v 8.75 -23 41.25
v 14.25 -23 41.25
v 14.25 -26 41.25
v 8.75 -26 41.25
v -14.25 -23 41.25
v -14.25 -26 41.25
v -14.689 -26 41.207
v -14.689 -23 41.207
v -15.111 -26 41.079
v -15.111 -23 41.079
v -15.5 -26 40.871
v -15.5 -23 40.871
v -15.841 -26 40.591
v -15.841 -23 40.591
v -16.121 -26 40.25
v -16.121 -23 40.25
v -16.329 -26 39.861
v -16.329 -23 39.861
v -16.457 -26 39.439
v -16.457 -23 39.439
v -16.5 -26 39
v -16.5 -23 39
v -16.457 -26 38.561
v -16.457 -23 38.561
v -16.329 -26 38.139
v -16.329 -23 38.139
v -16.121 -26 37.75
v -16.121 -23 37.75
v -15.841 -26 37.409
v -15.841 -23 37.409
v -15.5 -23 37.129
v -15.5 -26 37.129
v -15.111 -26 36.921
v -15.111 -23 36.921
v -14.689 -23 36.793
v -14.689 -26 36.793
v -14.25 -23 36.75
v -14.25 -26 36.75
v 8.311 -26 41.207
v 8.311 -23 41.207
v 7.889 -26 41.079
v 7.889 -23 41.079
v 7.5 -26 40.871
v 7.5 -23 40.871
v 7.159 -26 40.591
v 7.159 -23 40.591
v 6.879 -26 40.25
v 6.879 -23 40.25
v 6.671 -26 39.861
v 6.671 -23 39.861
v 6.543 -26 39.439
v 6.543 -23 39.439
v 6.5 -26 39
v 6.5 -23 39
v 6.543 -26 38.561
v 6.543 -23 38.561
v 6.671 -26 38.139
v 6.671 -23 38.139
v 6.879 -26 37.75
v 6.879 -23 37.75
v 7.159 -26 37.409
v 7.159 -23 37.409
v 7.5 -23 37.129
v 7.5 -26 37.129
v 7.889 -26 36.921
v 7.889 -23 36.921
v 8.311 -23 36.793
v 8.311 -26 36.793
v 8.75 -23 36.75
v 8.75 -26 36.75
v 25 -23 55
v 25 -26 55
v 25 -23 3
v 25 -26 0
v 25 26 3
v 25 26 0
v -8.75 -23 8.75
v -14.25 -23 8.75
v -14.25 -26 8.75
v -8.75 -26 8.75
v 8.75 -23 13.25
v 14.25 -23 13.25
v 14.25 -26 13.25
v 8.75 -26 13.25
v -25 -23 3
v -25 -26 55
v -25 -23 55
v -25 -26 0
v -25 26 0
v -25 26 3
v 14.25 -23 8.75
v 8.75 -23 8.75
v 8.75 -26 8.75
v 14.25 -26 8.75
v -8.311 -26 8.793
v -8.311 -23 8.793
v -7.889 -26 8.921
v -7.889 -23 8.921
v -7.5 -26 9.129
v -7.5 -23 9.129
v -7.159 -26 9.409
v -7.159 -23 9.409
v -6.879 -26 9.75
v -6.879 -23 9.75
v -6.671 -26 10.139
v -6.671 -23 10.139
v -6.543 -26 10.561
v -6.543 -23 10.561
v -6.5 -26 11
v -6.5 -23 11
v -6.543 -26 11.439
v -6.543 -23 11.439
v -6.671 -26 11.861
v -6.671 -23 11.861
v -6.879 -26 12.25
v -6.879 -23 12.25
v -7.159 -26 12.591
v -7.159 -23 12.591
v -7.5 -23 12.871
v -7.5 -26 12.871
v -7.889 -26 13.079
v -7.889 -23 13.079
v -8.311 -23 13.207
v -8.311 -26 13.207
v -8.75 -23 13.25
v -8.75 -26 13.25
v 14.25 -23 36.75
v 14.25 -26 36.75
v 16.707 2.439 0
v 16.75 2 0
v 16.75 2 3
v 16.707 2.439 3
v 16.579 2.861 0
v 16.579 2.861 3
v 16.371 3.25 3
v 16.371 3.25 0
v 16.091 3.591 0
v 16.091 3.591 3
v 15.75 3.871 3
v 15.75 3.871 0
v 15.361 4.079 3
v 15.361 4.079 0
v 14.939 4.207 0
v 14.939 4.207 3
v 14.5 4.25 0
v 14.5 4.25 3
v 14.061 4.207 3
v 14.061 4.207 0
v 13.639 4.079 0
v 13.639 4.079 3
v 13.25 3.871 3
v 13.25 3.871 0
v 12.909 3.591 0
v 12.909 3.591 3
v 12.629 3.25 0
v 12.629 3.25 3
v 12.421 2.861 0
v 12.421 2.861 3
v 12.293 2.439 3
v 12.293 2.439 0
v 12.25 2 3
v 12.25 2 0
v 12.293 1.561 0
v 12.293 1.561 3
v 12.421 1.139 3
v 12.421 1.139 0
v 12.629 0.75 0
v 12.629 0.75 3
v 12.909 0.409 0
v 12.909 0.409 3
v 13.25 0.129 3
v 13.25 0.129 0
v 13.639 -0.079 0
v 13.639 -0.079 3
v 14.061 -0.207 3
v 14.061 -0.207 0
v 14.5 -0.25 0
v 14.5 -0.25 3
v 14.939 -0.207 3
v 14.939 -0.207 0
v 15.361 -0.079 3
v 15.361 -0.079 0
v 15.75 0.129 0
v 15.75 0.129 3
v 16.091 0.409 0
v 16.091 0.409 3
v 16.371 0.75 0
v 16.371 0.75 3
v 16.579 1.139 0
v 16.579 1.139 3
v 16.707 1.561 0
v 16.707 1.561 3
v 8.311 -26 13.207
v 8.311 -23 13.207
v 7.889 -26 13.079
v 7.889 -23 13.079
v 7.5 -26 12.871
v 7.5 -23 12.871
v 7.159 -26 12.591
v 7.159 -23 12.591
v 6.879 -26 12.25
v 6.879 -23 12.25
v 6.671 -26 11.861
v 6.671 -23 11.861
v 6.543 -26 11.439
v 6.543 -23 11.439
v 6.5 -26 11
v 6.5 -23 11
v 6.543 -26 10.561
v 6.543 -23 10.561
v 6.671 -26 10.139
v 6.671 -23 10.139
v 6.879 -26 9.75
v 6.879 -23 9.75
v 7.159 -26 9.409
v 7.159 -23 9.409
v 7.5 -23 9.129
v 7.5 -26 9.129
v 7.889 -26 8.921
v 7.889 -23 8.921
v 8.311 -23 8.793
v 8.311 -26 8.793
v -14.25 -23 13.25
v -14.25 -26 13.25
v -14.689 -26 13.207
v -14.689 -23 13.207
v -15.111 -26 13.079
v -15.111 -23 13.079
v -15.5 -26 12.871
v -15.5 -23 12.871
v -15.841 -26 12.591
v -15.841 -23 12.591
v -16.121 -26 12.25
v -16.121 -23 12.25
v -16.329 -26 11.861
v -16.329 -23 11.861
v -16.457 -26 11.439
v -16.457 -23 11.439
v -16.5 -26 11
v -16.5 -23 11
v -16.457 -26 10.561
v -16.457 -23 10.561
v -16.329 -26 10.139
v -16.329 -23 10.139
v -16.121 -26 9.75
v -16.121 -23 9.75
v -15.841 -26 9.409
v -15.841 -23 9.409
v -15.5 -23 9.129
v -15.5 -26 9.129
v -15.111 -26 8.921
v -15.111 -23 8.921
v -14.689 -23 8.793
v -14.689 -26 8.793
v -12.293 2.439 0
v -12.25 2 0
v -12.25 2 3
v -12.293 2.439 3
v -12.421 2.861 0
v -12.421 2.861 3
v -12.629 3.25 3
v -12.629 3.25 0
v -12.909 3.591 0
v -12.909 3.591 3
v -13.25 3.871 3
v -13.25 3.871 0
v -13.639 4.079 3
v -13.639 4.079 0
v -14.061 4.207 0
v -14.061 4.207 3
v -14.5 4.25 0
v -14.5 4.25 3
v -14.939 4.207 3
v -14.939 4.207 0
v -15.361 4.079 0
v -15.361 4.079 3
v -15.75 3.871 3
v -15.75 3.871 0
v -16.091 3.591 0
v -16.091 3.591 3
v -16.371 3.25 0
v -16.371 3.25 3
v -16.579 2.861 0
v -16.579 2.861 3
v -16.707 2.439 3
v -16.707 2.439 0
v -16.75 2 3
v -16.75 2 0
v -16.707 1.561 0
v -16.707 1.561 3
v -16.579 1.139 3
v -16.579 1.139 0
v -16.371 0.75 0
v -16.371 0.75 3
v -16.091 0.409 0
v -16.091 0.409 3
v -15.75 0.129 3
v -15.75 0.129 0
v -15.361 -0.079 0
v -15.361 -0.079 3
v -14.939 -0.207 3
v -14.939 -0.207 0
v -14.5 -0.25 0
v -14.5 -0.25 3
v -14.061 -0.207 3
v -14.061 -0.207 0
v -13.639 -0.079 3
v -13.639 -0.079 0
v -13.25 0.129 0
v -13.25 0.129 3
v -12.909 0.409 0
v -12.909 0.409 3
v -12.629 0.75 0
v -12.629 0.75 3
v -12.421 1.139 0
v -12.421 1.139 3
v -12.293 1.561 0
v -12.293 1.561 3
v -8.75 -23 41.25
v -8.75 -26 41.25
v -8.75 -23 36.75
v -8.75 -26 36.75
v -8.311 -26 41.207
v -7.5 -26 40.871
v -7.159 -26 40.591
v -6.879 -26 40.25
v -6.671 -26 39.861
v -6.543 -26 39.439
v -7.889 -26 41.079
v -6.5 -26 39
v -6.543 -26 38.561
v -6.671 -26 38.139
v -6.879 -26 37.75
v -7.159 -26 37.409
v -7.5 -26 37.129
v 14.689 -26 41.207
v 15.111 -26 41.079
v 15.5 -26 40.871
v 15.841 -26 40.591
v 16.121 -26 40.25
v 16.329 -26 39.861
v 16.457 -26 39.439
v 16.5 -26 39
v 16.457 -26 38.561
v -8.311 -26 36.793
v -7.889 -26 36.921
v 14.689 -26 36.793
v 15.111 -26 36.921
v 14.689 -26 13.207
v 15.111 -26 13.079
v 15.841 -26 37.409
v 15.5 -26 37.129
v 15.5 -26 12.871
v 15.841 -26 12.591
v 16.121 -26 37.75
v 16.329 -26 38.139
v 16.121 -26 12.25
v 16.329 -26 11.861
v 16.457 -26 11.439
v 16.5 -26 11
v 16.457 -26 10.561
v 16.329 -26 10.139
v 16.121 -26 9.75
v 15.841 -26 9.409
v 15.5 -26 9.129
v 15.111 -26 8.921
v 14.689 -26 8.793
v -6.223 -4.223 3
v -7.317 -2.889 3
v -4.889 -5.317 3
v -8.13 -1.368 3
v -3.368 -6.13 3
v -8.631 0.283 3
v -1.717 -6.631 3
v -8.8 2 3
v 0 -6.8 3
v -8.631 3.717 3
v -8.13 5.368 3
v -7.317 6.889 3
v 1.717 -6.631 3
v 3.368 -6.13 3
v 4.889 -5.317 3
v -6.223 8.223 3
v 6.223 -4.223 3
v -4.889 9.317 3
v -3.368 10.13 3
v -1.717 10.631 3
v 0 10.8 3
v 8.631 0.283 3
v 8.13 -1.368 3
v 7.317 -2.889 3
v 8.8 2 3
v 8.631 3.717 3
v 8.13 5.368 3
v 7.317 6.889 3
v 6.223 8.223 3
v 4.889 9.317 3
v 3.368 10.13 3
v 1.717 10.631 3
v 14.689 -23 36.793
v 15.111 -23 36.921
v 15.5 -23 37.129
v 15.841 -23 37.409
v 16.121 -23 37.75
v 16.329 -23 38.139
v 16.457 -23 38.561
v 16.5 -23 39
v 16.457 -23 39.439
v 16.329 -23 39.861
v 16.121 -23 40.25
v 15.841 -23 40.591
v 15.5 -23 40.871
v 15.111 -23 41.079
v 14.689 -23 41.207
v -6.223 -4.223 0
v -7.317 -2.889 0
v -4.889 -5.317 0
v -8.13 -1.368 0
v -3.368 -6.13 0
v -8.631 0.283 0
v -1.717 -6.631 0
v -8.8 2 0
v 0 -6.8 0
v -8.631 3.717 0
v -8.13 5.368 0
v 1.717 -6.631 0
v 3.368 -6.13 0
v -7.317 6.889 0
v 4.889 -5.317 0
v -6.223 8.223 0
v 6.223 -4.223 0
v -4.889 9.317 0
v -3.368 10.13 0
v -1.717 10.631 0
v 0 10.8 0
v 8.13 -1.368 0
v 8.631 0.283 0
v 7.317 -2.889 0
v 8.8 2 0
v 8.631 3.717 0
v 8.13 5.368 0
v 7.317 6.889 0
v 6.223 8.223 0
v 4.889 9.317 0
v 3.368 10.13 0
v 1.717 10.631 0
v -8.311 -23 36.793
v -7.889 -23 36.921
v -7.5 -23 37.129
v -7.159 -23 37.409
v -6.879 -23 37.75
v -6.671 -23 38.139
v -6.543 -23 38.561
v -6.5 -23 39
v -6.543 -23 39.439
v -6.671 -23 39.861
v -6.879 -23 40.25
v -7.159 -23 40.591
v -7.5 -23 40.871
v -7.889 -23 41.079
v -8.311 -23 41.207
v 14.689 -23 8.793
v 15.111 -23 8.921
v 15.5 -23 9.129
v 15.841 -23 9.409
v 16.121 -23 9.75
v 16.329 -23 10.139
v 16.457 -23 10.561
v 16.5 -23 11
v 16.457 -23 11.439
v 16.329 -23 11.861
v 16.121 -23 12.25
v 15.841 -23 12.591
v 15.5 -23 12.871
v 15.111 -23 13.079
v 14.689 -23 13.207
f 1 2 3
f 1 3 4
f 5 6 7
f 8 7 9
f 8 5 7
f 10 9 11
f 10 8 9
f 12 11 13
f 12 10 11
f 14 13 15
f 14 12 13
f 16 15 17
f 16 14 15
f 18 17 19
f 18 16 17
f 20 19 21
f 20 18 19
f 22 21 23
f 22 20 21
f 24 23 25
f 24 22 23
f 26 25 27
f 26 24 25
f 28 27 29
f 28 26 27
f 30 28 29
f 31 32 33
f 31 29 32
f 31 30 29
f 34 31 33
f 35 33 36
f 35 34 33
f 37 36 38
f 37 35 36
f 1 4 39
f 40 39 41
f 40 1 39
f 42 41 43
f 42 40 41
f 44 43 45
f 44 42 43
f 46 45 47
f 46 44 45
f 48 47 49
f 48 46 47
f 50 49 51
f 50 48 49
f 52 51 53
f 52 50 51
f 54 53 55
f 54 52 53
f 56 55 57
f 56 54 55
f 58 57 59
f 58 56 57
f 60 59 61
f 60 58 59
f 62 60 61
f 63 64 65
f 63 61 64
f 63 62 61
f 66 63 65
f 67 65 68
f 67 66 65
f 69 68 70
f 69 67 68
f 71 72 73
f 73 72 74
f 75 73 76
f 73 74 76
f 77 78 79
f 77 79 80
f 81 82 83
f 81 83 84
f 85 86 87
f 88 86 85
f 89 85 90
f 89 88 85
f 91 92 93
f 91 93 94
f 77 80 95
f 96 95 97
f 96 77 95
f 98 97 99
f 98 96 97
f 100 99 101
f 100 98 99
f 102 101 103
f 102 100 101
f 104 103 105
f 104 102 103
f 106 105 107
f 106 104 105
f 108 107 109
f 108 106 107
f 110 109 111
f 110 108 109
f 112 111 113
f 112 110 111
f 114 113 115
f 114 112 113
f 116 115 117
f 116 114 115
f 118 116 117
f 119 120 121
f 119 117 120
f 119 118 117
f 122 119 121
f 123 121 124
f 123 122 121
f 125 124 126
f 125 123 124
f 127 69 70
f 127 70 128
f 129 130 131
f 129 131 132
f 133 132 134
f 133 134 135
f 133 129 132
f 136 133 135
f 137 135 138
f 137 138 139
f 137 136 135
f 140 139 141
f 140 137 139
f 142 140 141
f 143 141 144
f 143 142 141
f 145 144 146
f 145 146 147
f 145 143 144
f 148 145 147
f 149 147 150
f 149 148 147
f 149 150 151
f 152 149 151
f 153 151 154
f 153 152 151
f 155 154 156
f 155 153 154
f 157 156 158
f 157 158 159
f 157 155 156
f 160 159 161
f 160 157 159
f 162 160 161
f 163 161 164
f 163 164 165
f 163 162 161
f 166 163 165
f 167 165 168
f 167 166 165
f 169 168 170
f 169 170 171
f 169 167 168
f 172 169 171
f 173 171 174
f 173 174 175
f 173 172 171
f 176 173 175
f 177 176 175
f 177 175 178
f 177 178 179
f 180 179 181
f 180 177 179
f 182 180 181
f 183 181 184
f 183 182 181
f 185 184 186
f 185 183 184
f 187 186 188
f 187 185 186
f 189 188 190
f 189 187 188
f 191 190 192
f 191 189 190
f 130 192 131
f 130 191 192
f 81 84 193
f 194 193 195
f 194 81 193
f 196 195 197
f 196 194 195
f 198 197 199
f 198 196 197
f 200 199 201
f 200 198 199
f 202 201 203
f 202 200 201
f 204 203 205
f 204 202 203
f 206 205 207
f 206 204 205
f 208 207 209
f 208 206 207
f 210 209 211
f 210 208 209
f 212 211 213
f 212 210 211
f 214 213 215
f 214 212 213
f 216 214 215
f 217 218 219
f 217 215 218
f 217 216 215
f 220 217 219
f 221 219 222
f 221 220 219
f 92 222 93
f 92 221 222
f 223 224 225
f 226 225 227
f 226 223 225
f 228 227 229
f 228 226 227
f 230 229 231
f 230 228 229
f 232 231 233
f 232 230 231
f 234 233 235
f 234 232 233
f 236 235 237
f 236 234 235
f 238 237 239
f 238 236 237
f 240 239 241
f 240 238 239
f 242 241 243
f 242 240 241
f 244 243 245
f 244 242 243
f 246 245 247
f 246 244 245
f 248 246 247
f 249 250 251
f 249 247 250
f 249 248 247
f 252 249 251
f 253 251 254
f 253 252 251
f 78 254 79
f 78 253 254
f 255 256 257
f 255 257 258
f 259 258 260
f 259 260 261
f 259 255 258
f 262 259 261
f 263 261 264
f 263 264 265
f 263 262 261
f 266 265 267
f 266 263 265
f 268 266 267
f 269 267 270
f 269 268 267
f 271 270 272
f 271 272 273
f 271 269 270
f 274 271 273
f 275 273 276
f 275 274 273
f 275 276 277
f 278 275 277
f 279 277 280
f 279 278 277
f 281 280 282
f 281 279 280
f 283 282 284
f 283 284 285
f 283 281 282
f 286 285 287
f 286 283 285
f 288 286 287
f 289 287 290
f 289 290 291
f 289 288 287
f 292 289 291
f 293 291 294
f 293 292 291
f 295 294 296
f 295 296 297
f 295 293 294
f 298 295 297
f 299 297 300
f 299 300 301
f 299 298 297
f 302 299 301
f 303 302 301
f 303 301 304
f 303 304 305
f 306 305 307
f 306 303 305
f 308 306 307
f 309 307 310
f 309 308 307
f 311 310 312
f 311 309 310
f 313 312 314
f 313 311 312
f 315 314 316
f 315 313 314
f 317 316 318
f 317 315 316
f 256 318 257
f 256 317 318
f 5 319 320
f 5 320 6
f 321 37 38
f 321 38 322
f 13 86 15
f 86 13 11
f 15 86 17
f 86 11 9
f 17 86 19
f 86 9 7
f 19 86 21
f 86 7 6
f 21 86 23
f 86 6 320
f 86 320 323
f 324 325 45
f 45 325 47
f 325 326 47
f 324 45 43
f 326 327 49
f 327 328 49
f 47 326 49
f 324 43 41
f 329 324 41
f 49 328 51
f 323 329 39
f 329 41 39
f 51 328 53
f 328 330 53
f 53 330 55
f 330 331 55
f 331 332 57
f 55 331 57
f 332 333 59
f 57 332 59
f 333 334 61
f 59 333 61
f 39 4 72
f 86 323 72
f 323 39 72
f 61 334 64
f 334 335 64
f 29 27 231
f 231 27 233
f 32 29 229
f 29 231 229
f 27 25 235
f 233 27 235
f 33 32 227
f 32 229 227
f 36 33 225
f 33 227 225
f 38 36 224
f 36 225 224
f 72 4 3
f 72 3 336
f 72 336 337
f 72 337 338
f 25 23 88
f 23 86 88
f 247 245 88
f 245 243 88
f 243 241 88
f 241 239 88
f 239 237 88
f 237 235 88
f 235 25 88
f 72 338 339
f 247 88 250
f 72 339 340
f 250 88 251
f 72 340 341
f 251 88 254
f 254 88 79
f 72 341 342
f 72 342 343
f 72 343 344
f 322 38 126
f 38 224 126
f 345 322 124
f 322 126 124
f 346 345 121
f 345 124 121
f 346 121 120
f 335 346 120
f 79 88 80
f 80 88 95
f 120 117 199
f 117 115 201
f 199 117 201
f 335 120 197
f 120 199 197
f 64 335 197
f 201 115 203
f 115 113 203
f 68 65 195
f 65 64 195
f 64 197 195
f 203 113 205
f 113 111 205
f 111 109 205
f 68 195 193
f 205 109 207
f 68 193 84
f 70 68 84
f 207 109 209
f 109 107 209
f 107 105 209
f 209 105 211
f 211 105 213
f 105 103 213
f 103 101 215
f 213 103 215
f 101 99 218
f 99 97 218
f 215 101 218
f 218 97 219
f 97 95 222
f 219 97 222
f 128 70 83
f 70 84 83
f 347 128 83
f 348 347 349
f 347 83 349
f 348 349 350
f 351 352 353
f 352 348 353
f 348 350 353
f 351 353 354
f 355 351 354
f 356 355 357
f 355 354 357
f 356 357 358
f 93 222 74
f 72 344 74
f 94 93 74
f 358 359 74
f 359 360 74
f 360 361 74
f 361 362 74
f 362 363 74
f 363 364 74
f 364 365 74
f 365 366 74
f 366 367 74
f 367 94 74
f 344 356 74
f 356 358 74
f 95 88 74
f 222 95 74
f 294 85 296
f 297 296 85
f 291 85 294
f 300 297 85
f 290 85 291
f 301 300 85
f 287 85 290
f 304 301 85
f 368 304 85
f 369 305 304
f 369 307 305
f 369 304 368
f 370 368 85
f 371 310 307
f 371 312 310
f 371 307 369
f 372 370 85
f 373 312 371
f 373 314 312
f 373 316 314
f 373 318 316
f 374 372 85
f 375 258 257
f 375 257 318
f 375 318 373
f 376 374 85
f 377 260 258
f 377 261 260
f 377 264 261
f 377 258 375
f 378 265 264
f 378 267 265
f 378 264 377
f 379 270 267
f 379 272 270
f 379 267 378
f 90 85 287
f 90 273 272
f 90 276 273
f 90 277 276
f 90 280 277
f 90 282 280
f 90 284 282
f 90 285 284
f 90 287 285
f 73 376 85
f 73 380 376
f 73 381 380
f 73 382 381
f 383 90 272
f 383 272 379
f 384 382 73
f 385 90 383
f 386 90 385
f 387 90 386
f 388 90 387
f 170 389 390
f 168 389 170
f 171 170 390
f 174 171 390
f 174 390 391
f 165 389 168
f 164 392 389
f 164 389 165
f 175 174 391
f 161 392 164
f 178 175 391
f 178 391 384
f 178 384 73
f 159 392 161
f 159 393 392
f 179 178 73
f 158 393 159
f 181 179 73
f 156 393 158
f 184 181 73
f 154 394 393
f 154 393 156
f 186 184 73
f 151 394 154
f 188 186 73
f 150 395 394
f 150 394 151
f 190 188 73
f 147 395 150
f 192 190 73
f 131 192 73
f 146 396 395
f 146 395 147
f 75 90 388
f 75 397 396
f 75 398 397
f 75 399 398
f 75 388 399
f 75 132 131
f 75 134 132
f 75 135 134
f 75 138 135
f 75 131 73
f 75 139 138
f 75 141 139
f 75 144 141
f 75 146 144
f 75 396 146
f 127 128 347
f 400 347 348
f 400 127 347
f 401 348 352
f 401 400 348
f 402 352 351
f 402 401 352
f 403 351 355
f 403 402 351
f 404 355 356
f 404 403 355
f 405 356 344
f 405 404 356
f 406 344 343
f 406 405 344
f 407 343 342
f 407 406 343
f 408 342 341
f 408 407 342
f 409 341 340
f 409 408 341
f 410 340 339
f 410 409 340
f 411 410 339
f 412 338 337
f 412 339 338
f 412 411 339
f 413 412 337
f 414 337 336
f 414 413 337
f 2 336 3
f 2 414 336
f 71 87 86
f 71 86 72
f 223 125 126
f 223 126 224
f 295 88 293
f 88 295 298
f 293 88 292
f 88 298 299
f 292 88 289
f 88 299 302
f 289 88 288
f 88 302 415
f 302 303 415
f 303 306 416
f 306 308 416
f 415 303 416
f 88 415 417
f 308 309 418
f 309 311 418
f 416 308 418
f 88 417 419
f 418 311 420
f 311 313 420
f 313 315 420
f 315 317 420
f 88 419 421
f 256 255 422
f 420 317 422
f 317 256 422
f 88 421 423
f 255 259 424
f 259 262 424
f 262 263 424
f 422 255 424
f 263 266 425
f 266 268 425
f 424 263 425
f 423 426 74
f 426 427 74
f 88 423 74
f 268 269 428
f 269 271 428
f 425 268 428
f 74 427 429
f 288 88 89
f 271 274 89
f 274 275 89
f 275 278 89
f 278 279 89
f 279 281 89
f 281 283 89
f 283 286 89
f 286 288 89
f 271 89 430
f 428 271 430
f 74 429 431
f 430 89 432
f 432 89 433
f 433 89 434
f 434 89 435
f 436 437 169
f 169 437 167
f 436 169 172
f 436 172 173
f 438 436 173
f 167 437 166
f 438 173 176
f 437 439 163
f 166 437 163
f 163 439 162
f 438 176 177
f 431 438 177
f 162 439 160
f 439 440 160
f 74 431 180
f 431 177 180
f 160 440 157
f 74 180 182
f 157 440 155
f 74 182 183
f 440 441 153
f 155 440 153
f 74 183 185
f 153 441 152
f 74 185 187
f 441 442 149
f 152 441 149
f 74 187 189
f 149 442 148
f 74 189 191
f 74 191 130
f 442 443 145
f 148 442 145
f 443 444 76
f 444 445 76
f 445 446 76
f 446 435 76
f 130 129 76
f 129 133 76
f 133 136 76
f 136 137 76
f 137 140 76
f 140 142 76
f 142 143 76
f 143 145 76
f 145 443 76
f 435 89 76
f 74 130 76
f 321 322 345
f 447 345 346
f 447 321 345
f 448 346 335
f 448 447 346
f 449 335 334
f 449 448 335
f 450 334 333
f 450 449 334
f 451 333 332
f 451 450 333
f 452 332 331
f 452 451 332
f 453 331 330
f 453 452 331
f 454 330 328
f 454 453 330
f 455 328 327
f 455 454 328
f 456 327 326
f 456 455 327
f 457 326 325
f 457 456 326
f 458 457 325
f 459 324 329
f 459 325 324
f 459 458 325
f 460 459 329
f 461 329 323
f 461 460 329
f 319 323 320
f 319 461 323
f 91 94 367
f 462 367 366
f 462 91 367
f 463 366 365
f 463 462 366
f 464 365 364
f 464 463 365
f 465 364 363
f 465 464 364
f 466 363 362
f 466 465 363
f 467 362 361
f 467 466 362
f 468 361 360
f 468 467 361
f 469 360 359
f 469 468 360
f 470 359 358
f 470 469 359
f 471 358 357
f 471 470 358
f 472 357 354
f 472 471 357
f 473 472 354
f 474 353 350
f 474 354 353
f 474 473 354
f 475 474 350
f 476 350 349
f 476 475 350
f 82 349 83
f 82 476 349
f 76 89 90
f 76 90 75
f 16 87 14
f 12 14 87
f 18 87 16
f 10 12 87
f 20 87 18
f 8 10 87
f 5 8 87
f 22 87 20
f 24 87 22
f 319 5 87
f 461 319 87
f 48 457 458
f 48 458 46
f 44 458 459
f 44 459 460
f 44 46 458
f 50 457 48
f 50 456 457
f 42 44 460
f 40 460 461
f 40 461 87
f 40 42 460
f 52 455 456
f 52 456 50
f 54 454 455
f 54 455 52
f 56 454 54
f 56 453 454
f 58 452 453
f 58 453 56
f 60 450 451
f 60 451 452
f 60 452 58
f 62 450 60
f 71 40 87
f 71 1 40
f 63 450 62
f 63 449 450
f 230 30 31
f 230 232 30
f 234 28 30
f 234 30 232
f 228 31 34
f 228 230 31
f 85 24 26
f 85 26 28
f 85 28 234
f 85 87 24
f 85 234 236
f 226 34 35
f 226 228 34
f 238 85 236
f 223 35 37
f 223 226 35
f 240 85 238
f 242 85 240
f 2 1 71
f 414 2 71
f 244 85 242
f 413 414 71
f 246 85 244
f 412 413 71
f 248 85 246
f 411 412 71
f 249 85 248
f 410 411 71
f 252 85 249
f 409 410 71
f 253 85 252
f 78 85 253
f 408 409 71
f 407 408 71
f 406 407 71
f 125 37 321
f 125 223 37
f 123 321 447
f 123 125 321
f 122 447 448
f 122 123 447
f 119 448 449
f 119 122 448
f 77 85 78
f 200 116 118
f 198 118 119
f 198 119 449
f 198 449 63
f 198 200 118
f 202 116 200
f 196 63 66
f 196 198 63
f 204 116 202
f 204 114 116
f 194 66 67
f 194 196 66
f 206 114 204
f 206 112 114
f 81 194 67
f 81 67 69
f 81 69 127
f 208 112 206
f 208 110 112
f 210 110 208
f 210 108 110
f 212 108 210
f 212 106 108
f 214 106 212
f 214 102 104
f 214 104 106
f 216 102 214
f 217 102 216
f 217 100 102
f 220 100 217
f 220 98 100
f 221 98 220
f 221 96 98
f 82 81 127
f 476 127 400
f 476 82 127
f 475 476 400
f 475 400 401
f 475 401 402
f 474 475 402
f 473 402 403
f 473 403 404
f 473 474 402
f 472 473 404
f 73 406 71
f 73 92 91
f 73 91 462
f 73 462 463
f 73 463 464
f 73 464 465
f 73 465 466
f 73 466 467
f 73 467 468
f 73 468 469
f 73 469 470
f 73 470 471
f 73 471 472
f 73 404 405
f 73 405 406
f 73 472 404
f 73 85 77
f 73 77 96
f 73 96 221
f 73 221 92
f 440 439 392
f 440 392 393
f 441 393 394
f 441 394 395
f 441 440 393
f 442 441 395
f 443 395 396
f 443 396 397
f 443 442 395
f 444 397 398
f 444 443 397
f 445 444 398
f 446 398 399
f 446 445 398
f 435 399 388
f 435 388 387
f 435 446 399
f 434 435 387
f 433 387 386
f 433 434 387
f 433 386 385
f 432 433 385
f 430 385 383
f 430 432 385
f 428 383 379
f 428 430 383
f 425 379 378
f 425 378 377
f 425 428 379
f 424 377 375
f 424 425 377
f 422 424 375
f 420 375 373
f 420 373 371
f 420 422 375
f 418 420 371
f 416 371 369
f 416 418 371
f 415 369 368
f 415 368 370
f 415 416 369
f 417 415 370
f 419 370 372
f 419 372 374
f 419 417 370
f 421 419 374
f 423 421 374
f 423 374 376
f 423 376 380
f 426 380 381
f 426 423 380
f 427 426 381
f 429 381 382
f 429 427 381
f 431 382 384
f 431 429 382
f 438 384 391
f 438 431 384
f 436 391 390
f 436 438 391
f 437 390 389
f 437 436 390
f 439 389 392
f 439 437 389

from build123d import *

# Parameters (mm, degrees)
SKIZZE1_W                       = 50
SKIZZE1_H                       = 52
SKIZZE1_R                       = 8.8
SKIZZE1_R_2                     = 2.25
AUFSATZ_LINEAR_AUSTRAGEN1_DEPTH = 3
SKIZZE2_W                       = 50
SKIZZE2_H                       = 2.999801306
AUFSATZ_LINEAR_AUSTRAGEN2_DEPTH = 52
SCHNITT_LINEAR_AUSTRAGEN1_DEPTH = 78.788299069


with BuildPart() as part:
    # Skizze1 → Aufsatz-Linear austragen1 (new body)
    with BuildSketch(Plane.XY):
        Rectangle(SKIZZE1_W, SKIZZE1_H)
        with Locations((0, 2)):
            Circle(SKIZZE1_R, mode=Mode.SUBTRACT)
        with Locations((-14.5, 2)):
            Circle(SKIZZE1_R_2, mode=Mode.SUBTRACT)
        with Locations((14.5, 2)):
            Circle(SKIZZE1_R_2, mode=Mode.SUBTRACT)
    extrude(amount=AUFSATZ_LINEAR_AUSTRAGEN1_DEPTH)

    # Skizze2 → Aufsatz-Linear austragen2 (add)
    with BuildSketch(Plane.XY.offset(3)):
        with Locations((0, -24.500099347)):
            Rectangle(SKIZZE2_W, SKIZZE2_H)
    extrude(amount=AUFSATZ_LINEAR_AUSTRAGEN2_DEPTH)

    # Skizze3 → Schnitt-Linear austragen1 (cut, through all)
    with BuildSketch(Plane(origin=(0, -23.000198694, 0), x_dir=(1, 0, 0), z_dir=(0, 1, 0))):
        with BuildLine():
            Line((-14.25, -36.75), (-8.75, -36.75))
            ThreePointArc((-8.75, -36.75), (-6.5, -39), (-8.75, -41.25))
            Line((-8.75, -41.25), (-14.25, -41.25))
            ThreePointArc((-14.25, -41.25), (-16.5, -39), (-14.25, -36.75))
        make_face()
        with BuildLine():
            Line((8.75, -36.75), (14.25, -36.75))
            ThreePointArc((14.25, -36.75), (16.5, -39), (14.25, -41.25))
            Line((14.25, -41.25), (8.75, -41.25))
            ThreePointArc((8.75, -41.25), (6.5, -39), (8.75, -36.75))
        make_face()
        with BuildLine():
            Line((-14.25, -8.75), (-8.75, -8.75))
            ThreePointArc((-8.75, -8.75), (-6.5, -11), (-8.75, -13.25))
            Line((-8.75, -13.25), (-14.25, -13.25))
            ThreePointArc((-14.25, -13.25), (-16.5, -11), (-14.25, -8.75))
        make_face()
        with BuildLine():
            Line((8.75, -8.75), (14.25, -8.75))
            ThreePointArc((14.25, -8.75), (16.5, -11), (14.25, -13.25))
            Line((14.25, -13.25), (8.75, -13.25))
            ThreePointArc((8.75, -13.25), (6.5, -11), (8.75, -8.75))
        make_face()
    extrude(amount=-SCHNITT_LINEAR_AUSTRAGEN1_DEPTH, mode=Mode.SUBTRACT)


solid = part.part
